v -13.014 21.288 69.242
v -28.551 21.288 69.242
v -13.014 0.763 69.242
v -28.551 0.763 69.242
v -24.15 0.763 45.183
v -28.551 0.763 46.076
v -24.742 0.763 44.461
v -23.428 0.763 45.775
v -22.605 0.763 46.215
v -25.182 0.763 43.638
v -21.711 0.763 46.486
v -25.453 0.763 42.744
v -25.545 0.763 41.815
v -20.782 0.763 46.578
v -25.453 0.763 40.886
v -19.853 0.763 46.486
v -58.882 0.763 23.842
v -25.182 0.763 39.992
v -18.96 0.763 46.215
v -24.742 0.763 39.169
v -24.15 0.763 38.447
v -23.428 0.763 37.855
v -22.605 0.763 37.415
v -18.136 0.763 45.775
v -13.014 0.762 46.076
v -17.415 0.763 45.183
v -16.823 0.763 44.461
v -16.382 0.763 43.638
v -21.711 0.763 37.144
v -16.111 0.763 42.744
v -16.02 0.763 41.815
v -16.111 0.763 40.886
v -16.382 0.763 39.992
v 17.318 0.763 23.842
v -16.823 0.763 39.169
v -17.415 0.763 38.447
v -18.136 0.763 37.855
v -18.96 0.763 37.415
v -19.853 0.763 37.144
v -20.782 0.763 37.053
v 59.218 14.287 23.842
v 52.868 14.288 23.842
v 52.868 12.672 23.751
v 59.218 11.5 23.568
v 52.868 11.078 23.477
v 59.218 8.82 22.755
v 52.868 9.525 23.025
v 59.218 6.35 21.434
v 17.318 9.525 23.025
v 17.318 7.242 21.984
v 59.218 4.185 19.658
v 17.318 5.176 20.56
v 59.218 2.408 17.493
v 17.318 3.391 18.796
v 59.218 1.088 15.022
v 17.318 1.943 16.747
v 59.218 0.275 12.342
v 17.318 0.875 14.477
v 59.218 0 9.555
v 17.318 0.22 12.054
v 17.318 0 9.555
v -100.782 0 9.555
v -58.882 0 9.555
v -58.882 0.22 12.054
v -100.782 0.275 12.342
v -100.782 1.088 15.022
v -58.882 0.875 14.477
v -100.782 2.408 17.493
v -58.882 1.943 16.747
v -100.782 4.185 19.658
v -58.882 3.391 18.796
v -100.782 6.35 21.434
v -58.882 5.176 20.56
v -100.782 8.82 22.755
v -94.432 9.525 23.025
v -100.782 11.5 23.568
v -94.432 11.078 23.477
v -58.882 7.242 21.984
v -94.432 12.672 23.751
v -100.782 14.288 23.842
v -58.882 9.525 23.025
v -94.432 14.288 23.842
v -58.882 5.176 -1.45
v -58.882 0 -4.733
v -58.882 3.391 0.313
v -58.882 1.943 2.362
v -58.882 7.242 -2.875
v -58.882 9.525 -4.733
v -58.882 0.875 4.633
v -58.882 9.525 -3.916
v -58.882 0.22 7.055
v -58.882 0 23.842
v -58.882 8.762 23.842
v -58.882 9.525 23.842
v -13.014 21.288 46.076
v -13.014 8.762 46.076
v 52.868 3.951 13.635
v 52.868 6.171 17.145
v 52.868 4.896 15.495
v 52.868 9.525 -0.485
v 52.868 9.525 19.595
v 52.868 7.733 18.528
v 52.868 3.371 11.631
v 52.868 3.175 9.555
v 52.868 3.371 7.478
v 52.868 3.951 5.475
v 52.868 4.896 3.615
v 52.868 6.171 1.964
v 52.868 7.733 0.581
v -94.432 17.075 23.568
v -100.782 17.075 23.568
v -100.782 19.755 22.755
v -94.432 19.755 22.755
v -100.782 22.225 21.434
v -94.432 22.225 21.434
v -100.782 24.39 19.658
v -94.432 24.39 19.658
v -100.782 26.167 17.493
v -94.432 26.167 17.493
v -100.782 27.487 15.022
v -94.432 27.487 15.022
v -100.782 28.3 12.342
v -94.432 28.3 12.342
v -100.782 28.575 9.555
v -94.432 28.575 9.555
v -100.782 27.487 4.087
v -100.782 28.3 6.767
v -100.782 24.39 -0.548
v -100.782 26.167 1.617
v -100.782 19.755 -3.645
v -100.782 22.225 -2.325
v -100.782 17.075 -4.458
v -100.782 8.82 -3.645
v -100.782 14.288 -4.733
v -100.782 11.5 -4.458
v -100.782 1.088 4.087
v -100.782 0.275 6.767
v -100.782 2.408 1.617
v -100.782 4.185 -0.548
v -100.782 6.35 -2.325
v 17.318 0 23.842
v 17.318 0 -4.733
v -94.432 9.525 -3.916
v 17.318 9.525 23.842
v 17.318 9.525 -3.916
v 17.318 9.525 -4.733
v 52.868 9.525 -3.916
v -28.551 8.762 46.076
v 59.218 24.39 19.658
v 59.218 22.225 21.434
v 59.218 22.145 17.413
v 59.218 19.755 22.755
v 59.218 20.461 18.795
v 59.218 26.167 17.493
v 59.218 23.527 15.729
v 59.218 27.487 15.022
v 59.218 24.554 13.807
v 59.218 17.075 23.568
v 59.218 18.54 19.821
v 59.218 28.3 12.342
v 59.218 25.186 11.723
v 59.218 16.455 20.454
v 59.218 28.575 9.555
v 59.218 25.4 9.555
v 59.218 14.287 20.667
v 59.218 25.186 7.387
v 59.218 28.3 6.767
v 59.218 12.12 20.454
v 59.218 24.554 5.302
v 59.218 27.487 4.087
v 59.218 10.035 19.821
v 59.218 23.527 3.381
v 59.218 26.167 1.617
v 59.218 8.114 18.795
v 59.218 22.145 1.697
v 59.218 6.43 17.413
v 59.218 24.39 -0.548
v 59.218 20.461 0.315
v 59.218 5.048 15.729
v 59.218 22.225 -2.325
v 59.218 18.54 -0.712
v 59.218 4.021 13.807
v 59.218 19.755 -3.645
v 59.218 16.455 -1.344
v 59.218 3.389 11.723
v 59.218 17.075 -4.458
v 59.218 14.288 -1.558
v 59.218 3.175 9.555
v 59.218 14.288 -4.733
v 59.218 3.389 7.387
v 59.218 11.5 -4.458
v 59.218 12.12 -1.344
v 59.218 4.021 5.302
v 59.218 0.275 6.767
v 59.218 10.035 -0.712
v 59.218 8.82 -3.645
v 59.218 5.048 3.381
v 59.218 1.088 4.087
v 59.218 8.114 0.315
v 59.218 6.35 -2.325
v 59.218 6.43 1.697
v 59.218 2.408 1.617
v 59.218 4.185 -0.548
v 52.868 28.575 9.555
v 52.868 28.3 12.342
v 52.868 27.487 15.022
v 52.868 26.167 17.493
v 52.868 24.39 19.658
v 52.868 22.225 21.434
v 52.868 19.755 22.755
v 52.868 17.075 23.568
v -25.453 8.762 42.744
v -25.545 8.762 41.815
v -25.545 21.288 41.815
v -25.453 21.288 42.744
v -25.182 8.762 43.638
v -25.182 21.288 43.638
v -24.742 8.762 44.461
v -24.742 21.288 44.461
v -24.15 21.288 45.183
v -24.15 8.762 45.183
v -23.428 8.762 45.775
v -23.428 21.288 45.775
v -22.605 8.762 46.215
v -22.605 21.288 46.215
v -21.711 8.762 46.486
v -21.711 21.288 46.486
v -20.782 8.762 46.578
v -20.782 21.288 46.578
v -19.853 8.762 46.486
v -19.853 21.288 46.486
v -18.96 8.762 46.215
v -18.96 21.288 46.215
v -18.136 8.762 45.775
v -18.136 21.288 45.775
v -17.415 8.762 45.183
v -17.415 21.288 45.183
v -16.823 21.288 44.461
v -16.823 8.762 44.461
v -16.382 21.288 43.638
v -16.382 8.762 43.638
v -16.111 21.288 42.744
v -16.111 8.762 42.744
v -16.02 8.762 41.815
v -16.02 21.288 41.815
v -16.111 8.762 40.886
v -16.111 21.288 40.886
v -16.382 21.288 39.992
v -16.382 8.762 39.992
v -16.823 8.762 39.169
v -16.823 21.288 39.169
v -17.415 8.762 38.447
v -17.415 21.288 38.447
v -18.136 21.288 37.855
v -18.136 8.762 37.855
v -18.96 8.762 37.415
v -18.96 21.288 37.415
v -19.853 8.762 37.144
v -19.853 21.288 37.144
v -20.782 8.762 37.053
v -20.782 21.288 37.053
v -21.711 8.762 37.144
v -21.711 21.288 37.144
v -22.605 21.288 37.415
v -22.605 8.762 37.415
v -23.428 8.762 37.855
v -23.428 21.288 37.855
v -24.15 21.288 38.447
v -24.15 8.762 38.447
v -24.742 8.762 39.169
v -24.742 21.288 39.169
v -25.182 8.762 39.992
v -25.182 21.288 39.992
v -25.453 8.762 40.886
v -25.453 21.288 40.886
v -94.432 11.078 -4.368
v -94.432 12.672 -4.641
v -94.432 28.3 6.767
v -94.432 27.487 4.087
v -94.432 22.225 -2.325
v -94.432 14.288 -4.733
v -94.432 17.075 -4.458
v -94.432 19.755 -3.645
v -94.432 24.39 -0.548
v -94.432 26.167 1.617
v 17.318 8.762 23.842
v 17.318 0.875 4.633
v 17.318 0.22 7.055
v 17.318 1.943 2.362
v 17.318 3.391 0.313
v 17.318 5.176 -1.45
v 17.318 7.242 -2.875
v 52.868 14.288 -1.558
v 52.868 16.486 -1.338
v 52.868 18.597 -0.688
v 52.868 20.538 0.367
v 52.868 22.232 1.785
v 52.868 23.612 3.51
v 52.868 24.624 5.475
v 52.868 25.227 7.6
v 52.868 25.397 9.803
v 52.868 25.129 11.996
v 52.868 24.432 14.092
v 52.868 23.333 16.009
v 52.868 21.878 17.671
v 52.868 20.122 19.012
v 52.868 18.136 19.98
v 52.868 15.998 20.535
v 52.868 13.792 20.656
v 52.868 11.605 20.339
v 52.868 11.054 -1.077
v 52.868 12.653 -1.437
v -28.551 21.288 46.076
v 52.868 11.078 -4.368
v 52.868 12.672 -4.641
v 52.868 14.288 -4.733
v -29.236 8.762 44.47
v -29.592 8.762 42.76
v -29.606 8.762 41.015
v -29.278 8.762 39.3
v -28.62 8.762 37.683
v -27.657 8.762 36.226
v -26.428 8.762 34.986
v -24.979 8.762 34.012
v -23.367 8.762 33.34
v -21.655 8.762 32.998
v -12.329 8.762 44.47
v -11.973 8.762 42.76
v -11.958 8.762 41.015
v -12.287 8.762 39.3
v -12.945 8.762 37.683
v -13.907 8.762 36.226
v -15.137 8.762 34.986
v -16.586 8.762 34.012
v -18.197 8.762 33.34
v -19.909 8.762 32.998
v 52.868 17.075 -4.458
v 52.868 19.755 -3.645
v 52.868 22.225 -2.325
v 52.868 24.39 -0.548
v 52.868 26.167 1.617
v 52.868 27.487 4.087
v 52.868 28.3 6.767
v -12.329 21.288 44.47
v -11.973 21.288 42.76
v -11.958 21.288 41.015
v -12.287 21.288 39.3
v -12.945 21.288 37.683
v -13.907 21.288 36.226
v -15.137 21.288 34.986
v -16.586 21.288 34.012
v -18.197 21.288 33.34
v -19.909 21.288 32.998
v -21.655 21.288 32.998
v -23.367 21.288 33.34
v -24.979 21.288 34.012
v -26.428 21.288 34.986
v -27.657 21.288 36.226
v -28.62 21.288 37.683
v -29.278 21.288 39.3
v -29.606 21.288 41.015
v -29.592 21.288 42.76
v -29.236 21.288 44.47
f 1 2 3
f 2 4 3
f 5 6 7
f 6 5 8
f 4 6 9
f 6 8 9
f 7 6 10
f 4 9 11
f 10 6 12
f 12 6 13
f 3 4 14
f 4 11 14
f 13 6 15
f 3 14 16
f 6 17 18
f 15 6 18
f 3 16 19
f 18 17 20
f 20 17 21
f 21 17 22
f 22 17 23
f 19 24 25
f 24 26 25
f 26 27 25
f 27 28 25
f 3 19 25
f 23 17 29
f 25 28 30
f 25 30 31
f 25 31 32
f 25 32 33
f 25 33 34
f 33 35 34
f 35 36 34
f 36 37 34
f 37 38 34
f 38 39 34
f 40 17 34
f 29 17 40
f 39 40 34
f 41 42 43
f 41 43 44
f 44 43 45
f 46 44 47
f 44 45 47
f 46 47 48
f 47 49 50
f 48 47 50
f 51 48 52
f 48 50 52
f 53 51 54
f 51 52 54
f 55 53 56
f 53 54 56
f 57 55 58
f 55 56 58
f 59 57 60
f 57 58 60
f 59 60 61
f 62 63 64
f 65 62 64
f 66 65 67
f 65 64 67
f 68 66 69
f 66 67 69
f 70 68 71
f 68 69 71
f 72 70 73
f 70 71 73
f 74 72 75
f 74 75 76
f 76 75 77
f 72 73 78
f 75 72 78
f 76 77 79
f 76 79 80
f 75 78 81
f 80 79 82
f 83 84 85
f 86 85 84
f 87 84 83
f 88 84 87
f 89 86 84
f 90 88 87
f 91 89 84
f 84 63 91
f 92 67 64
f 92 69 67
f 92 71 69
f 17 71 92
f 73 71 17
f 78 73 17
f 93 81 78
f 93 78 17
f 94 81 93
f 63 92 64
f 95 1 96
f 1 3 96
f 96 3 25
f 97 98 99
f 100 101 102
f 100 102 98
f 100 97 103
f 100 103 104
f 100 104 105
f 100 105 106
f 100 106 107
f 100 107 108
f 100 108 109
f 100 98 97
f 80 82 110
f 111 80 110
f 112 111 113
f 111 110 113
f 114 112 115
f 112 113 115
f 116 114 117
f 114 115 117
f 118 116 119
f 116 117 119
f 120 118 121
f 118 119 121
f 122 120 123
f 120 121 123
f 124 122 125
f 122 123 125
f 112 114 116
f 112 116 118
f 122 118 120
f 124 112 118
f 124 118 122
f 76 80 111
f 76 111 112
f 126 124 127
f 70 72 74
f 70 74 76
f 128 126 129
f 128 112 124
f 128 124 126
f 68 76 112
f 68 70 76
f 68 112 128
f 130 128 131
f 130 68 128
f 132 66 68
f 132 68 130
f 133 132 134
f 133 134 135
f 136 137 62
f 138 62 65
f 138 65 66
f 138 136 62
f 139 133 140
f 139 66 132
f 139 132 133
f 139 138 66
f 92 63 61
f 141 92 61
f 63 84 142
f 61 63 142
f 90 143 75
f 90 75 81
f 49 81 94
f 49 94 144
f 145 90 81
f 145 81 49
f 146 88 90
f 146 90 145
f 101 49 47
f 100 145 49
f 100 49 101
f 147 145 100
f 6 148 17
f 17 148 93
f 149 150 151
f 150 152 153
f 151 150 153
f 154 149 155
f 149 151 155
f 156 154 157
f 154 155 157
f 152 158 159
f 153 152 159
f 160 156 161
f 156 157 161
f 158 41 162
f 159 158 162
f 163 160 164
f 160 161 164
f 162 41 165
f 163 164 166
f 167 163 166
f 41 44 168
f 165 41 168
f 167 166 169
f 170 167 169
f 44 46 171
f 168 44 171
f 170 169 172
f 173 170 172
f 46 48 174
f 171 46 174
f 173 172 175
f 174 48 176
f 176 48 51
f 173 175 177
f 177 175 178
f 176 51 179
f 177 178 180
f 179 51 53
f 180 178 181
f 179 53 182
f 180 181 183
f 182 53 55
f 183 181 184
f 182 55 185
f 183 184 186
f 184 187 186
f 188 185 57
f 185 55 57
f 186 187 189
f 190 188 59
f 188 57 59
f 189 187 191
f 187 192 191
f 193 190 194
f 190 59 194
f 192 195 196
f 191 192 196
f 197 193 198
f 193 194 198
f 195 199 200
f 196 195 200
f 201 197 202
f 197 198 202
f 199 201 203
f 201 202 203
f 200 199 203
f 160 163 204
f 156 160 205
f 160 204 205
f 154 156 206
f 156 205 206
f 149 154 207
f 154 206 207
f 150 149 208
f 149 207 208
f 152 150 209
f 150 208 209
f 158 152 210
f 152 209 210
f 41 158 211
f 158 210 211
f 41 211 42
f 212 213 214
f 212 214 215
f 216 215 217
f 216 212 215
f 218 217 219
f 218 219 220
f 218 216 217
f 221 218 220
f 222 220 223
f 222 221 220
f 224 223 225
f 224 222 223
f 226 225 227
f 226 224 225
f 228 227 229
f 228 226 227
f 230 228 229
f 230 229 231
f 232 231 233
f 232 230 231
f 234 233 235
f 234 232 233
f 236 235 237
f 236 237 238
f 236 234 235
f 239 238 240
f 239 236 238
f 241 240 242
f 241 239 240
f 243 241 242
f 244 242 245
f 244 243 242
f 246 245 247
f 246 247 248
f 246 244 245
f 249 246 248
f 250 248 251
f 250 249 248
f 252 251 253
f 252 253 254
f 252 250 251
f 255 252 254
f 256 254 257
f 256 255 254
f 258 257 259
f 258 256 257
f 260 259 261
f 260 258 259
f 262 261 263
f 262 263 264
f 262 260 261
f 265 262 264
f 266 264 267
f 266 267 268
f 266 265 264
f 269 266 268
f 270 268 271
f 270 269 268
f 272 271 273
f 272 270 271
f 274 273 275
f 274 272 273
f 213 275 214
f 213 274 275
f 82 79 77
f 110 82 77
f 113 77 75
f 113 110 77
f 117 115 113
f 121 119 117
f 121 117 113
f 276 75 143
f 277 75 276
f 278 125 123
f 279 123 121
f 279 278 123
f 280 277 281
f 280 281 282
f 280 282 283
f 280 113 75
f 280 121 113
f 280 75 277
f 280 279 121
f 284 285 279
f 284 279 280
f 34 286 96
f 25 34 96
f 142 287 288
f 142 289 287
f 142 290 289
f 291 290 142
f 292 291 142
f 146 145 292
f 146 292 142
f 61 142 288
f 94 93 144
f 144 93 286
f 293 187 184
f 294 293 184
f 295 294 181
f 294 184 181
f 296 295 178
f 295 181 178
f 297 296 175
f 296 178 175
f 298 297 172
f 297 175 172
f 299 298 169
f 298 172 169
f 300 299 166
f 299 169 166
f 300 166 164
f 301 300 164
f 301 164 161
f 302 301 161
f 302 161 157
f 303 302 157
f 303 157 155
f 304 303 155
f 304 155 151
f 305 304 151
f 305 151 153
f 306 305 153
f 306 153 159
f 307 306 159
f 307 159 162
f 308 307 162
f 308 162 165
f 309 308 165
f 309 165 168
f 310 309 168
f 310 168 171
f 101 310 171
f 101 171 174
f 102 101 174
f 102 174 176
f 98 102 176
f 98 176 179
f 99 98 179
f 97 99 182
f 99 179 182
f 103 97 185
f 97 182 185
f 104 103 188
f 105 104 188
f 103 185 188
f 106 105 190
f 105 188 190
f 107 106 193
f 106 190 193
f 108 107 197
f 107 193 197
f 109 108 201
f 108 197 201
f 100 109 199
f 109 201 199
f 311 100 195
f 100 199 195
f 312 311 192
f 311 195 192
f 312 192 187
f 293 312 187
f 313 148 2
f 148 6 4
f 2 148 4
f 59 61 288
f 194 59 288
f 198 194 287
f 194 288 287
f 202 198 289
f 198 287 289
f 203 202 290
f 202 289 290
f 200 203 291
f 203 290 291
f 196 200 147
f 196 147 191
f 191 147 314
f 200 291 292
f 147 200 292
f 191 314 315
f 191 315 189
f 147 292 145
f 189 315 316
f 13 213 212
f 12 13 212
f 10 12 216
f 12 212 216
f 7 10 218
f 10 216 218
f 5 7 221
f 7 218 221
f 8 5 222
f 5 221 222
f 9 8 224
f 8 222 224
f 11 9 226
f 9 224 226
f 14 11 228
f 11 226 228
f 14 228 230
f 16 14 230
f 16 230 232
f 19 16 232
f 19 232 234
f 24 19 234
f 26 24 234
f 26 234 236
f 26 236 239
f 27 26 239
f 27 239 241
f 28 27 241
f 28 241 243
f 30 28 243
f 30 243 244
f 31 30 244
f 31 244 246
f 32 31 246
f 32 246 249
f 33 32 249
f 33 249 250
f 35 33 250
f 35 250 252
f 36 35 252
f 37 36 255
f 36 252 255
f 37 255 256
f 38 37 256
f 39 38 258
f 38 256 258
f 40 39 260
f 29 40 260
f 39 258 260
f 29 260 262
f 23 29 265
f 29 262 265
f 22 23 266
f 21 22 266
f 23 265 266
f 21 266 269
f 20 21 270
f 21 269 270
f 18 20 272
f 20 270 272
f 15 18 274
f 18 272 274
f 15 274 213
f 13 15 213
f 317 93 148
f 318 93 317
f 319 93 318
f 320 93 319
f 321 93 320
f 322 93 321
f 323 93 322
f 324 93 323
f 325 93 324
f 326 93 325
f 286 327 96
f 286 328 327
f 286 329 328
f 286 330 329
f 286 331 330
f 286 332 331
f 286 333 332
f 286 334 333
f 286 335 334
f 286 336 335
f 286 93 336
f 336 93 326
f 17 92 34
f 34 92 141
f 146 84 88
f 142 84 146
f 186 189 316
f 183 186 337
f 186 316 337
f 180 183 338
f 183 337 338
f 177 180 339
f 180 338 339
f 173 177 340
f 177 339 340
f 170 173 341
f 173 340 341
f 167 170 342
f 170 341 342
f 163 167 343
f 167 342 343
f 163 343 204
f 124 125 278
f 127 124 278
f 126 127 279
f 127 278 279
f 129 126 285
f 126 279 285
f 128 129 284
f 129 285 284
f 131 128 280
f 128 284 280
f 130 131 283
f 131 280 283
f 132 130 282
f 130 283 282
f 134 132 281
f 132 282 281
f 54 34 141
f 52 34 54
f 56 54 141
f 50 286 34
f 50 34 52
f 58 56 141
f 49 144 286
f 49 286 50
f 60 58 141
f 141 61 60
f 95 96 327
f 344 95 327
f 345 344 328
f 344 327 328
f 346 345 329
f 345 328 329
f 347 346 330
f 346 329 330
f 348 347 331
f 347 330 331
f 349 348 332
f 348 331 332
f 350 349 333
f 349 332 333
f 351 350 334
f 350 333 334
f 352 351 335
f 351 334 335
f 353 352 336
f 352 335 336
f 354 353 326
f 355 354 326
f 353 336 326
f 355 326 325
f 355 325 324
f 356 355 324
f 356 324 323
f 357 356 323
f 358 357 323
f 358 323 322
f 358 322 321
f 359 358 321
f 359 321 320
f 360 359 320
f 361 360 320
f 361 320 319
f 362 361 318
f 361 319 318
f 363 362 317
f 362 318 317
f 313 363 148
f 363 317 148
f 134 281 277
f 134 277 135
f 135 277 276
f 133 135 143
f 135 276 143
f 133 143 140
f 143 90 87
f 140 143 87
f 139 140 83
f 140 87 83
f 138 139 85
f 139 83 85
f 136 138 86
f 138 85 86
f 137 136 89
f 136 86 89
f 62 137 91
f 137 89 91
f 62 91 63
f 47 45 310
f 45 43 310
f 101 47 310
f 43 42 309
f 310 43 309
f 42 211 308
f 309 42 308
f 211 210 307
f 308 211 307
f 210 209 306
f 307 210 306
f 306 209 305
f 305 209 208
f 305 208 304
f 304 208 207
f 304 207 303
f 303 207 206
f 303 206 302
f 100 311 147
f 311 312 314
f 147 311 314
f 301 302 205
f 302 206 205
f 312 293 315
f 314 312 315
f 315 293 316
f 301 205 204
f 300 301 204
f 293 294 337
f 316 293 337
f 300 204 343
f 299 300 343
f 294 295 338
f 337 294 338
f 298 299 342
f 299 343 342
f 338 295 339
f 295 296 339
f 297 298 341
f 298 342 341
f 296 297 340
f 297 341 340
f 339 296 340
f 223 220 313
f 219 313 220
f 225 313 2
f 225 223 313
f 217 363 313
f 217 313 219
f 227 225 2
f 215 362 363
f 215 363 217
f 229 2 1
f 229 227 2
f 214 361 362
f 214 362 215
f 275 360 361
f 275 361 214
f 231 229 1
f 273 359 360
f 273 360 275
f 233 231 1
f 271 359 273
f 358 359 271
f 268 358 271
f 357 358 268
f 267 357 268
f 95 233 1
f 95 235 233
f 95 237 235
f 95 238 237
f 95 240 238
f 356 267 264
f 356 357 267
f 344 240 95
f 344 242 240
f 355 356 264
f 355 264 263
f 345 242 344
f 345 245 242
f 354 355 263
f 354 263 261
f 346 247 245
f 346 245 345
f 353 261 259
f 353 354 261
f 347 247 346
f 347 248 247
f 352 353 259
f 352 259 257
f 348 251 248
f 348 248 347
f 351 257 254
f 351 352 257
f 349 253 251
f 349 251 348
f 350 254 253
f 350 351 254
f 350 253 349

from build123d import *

# Parameters (mm, degrees)
SKETCH1_W           = 160
SKETCH1_H           = 28.575
BOSS_EXTRUDE1_DEPTH = 28.575
SKETCH3_W           = 147.3
SKETCH3_H           = 28.575
CUT_EXTRUDE3_DEPTH  = 19.05
SKETCH4_W           = 76.2
SKETCH4_H           = 8
BOSS_EXTRUDE2_DEPTH = 45.4
CUT_EXTRUDE8_DEPTH  = 124.871382326
SKETCH9_R           = 4.7625
BOSS_EXTRUDE4_DEPTH = 12.525
SKETCH10_R          = 4.7625
CUT_EXTRUDE10_DEPTH = 124.871382326
CUT_EXTRUDE11_START = -41.9
SKETCH2_OUTSIDE_W   = 111.689
SKETCH2_OUTSIDE_H   = 66.289
SKETCH2_OUTSIDE_R   = 14.2875
CUT_EXTRUDE11_DEPTH = 41.9
CUT_EXTRUDE13_START = -41.9
SKETCH13_OUTSIDE_W  = 111.689
SKETCH13_OUTSIDE_H  = 66.289
SKETCH13_OUTSIDE_R  = 14.2875
CUT_EXTRUDE13_DEPTH = 41.9
SKETCH14_R          = 11.1125
CUT_EXTRUDE14_DEPTH = 6.35


with BuildPart() as part:
    # Sketch1 → Boss-Extrude1 (new body)
    with BuildSketch(Plane(origin=(0, 0, 0), x_dir=(1, 0, 0), z_dir=(0, 1, 0))):
        with Locations((-20.782379652, -9.554800327)):
            Rectangle(SKETCH1_W, SKETCH1_H)
    extrude(amount=BOSS_EXTRUDE1_DEPTH)

    # Sketch3 → Cut-Extrude3 (cut)
    with BuildSketch(Plane(origin=(0, 28.575, 0), x_dir=(1, 0, 0), z_dir=(0, 1, 0))):
        with Locations((-20.782379652, -9.554800327)):
            Rectangle(SKETCH3_W, SKETCH3_H)
    extrude(amount=-CUT_EXTRUDE3_DEPTH, mode=Mode.SUBTRACT)

    # Sketch4 → Boss-Extrude2 (add)
    with BuildSketch(Plane.XY.offset(23.842300327)):
        with Locations((-20.782379652, 4.7625)):
            Rectangle(SKETCH4_W, SKETCH4_H)
    extrude(amount=BOSS_EXTRUDE2_DEPTH)

    # Sketch5 → Cut-Extrude8 (cut, through all)
    with BuildSketch(Plane(origin=(0, 8.7625, 0), x_dir=(1, 0, 0), z_dir=(0, 1, 0))):
        Polygon((-13.013921372, -46.075787503), (-13.013921372, -69.242300327), (17.317620348, -69.242300327), (17.317620348, -23.842300327), align=None)
        Polygon((-28.550837933, -69.242300327), (-28.550837933, -46.075787503), (-58.882379652, -23.842300327), (-58.882379652, -69.242300327), align=None)
    extrude(amount=-CUT_EXTRUDE8_DEPTH, mode=Mode.SUBTRACT)

    # Sketch9 → Boss-Extrude4 (add)
    with BuildSketch(Plane(origin=(0, 8.7625, 0), x_dir=(1, 0, 0), z_dir=(0, 1, 0))):
        with BuildLine():
            Line((-28.550837933, -46.075787503), (-28.550837933, -69.242300327))
            Line((-28.550837933, -69.242300327), (-13.013921372, -69.242300327))
            Line((-13.013921372, -69.242300327), (-13.013921372, -46.075787503))
            ThreePointArc((-13.013921372, -46.075787503), (-20.782379652, -32.954800327), (-28.550837933, -46.075787503))
        make_face()
        with Locations(Location((-20.782379652, -41.815004419, 0), (0, 0, 180))):
            Circle(SKETCH9_R, mode=Mode.SUBTRACT)
    extrude(amount=BOSS_EXTRUDE4_DEPTH)

    # Sketch10 → Cut-Extrude10 (cut, through all)
    with BuildSketch(Plane(origin=(0, 8.7625, 0), x_dir=(1, 0, 0), z_dir=(0, 1, 0))):
        with Locations(Location((-20.782379652, -41.815004419, 0), (0, 0, 180))):
            Circle(SKETCH10_R)
    extrude(amount=-CUT_EXTRUDE10_DEPTH, mode=Mode.SUBTRACT)

    # Sketch2 outside → Cut-Extrude11 (cut)
    with BuildSketch(Plane(origin=(59.217620348, 0, 0), x_dir=(0, 0, -1), z_dir=(1, 0, 0)).offset(CUT_EXTRUDE11_START)):
        with Locations((-32.2545, 14.2875)):
            Rectangle(SKETCH2_OUTSIDE_W, SKETCH2_OUTSIDE_H)
        with Locations((-9.554800327, 14.2875)):
            Circle(SKETCH2_OUTSIDE_R, mode=Mode.SUBTRACT)
    extrude(amount=CUT_EXTRUDE11_DEPTH, mode=Mode.SUBTRACT)

    # Sketch13 outside → Cut-Extrude13 (cut)
    with BuildSketch(Plane.ZY.offset(100.782379652).offset(CUT_EXTRUDE13_START)):
        with Locations((32.2545, 14.2875)):
            Rectangle(SKETCH13_OUTSIDE_W, SKETCH13_OUTSIDE_H)
        with Locations(Location((9.554800327, 14.2875, 0), (0, 0, 180))):
            Circle(SKETCH13_OUTSIDE_R, mode=Mode.SUBTRACT)
    extrude(amount=CUT_EXTRUDE13_DEPTH, mode=Mode.SUBTRACT)

    # Sketch14 → Cut-Extrude14 (cut)
    with BuildSketch(Plane(origin=(59.217620348, 0, 0), x_dir=(0, 0, -1), z_dir=(1, 0, 0))):
        with Locations((-9.554800327, 14.2875)):
            Circle(SKETCH14_R)
    extrude(amount=-CUT_EXTRUDE14_DEPTH, mode=Mode.SUBTRACT)


solid = part.part
